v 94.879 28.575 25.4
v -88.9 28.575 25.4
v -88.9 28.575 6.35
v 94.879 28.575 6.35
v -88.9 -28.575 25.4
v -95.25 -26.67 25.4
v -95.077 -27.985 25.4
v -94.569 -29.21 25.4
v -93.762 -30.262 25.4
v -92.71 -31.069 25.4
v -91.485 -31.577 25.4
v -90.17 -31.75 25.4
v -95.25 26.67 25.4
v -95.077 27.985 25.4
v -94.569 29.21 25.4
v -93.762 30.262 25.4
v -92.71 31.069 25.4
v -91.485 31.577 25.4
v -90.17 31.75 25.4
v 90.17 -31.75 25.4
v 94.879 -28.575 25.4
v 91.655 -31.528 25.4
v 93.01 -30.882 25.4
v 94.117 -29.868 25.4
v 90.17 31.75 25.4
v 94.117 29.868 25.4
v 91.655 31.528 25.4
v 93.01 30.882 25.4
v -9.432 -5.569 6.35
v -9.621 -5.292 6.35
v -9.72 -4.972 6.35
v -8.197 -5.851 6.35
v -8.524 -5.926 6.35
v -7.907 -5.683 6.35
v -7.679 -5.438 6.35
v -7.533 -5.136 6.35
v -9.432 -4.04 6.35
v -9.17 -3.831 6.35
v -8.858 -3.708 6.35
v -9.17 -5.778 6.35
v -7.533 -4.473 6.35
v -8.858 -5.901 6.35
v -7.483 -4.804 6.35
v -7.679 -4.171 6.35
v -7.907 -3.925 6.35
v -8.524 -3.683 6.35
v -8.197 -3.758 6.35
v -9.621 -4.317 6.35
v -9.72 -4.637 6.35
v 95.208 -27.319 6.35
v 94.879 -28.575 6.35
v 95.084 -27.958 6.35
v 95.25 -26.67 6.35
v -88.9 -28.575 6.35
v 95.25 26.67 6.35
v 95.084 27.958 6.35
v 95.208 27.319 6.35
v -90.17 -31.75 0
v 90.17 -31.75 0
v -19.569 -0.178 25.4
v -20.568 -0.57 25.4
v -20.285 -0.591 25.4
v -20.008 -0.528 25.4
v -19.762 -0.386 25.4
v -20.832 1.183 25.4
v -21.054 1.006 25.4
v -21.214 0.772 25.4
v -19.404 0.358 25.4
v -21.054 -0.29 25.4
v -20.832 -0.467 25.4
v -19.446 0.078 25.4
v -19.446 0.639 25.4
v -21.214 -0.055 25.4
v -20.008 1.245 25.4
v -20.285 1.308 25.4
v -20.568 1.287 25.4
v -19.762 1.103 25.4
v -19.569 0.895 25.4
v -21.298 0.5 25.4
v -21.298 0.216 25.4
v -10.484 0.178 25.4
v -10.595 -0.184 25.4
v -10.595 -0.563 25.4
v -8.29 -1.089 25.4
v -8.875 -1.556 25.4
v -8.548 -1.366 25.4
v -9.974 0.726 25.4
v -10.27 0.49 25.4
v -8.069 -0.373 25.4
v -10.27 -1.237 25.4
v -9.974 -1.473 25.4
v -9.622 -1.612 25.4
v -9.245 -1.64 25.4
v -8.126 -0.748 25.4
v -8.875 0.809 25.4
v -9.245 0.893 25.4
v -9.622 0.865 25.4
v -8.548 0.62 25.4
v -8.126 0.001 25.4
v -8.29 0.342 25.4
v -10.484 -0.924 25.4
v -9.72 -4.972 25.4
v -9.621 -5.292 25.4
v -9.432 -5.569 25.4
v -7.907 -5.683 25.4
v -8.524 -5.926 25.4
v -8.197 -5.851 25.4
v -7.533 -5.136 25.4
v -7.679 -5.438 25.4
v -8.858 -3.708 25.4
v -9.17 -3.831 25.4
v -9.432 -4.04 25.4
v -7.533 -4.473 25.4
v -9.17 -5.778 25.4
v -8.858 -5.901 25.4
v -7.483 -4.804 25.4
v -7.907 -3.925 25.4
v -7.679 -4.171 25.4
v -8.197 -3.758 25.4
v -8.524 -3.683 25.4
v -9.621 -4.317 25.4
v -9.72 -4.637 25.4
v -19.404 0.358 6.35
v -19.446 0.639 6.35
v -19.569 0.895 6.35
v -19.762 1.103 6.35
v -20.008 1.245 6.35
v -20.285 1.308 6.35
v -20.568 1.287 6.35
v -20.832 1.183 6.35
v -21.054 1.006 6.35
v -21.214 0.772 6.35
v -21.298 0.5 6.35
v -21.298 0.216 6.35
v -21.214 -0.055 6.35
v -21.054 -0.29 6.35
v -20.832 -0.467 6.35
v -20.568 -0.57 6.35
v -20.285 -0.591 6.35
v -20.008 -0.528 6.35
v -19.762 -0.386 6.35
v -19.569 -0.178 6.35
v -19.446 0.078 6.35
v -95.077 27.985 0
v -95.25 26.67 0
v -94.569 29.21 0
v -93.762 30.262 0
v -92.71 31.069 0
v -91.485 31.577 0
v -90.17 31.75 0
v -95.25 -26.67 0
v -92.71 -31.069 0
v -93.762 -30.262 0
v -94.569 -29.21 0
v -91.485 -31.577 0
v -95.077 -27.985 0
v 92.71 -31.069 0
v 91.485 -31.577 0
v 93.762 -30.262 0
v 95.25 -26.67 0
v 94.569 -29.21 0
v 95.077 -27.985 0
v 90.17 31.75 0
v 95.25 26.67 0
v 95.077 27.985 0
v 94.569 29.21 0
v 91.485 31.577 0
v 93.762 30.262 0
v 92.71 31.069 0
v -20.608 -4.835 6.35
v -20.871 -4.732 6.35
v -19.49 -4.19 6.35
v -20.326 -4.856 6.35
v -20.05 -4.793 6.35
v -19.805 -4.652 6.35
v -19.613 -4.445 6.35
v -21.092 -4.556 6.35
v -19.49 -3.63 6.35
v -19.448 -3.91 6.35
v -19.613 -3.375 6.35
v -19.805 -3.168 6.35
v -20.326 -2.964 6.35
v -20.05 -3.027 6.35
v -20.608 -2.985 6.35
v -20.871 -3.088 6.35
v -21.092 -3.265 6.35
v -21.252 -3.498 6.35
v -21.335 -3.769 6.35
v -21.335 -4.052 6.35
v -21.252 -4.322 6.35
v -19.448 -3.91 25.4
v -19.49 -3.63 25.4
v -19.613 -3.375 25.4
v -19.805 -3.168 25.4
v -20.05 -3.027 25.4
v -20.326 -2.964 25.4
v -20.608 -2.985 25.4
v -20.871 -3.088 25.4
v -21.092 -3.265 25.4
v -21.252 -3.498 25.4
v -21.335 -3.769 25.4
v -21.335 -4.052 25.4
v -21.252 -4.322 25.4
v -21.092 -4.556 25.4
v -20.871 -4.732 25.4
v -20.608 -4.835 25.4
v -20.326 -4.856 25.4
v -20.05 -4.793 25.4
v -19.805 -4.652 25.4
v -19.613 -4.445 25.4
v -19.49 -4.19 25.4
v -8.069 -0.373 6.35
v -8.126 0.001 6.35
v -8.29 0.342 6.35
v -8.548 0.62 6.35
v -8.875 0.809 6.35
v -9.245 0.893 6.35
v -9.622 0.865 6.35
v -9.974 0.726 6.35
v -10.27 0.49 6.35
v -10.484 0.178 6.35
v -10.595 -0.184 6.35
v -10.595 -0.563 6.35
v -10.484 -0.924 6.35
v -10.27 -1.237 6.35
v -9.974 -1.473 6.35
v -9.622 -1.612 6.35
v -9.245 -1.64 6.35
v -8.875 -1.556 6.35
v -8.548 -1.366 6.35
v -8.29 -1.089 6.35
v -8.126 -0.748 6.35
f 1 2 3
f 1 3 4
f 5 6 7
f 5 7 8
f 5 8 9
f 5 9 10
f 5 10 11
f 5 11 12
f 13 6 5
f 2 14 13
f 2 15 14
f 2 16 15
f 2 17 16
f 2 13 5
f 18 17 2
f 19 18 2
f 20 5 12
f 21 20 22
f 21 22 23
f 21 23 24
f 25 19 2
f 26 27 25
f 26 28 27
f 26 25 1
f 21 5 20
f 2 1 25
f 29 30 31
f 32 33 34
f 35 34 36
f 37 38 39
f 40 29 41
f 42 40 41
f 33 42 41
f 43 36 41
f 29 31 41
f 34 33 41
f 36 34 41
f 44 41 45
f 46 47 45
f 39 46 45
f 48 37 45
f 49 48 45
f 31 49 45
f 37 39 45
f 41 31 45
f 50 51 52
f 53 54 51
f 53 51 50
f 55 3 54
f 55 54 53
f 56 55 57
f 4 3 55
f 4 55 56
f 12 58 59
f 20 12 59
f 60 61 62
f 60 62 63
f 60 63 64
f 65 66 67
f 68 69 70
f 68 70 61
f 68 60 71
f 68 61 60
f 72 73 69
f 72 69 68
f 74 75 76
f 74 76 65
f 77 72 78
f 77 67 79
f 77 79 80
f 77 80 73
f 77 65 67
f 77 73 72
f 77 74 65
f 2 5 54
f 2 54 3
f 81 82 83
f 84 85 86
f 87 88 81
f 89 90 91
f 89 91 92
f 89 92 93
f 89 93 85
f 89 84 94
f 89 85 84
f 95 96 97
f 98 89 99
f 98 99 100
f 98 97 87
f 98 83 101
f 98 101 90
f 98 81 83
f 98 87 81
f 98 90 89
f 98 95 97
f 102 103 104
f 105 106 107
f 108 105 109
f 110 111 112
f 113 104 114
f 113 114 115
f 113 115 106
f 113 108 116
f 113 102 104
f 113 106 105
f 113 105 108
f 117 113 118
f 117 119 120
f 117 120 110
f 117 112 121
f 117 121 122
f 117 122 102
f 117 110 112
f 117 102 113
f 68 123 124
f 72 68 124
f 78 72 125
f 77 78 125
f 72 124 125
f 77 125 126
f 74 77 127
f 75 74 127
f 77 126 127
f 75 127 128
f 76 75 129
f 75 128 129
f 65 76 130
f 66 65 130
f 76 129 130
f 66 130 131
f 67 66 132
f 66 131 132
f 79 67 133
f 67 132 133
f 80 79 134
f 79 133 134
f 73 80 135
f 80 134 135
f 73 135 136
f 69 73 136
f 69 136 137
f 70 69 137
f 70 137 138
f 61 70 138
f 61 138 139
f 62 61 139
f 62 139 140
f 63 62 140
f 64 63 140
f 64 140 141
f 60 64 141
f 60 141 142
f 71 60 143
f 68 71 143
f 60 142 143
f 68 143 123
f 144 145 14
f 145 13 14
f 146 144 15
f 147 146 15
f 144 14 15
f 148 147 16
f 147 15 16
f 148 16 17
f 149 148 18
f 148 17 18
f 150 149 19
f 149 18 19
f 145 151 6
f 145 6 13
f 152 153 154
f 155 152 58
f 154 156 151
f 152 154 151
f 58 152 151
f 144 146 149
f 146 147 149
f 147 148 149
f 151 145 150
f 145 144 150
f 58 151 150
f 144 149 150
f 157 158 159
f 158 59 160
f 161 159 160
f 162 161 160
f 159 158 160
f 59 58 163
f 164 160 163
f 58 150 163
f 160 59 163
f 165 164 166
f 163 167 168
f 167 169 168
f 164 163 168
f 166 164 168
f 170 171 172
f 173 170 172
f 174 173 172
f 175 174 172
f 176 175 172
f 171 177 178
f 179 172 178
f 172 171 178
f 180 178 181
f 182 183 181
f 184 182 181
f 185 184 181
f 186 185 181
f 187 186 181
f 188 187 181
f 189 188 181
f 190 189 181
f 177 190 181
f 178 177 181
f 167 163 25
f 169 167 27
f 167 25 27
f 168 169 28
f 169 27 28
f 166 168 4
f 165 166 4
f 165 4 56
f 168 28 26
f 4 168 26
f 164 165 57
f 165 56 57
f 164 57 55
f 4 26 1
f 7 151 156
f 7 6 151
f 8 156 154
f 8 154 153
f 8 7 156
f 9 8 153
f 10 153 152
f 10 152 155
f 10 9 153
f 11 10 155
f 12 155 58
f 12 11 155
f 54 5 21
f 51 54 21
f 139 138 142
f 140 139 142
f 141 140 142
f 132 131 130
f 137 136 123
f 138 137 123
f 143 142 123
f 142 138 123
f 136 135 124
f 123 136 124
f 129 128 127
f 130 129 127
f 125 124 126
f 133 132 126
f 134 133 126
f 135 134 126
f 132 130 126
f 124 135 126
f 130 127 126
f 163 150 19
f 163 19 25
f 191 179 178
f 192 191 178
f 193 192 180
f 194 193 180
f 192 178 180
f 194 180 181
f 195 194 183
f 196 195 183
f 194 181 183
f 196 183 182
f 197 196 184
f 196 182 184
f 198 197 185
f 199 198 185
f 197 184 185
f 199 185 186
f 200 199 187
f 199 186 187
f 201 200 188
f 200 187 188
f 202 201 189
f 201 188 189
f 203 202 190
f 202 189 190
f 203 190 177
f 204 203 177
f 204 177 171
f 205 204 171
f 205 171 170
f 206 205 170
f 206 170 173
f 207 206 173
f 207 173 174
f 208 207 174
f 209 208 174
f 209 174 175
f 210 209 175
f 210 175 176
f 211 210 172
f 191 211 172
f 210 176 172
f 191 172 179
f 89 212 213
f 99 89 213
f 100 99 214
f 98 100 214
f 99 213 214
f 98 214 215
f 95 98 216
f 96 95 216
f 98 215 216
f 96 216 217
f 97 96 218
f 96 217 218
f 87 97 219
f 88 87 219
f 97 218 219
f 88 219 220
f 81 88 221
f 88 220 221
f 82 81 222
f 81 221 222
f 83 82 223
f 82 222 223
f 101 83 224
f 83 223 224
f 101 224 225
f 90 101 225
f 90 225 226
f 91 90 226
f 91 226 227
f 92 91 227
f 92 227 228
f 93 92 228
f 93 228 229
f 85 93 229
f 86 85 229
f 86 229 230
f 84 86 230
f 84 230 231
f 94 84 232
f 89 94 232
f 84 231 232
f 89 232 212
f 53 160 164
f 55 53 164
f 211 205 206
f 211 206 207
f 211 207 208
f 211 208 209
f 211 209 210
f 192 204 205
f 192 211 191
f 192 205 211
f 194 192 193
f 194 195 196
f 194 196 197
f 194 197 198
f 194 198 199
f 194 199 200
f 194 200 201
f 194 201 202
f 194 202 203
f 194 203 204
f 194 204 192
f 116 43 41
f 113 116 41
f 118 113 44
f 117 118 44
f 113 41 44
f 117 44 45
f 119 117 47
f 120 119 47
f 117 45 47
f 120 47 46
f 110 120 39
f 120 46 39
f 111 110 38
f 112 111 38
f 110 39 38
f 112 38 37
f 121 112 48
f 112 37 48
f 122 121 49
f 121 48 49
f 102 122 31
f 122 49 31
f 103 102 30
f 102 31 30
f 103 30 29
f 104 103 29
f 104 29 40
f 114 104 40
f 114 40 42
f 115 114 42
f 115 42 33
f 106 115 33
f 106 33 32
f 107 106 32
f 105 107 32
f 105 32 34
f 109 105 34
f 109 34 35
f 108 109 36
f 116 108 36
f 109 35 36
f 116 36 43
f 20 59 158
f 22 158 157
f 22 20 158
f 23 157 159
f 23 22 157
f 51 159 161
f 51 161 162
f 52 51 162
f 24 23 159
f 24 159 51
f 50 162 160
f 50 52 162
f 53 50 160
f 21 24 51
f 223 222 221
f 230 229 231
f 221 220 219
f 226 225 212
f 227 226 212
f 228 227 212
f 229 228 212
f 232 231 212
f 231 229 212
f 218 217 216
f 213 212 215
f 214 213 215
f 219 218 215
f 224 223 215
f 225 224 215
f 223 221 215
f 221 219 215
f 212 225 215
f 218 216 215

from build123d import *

# Parameters (mm, degrees)
F0_W     = 190.5
F0_H     = 63.5
F1_DEPTH = 25.4
F2_W     = 184.15
F2_H     = 57.15
F3_DEPTH = 19.05
F4_R     = 0.952499
F4_R_2   = 0.949023
F4_R_3   = 1.27
F4_R_4   = 1.12437
F5_DEPTH = 19.05
F6_R     = 5.08


with BuildPart() as f1:
    # F0 (on Top) → F1 (new body)
    with BuildSketch(Plane.XY):
        Rectangle(F0_W, F0_H)
    extrude(amount=F1_DEPTH)

    # F2 (on face) → F3 (cut)
    with BuildSketch(Plane.XY.offset(25.4)):
        with Locations((3.175, 0)):
            Rectangle(F2_W, F2_H)
    extrude(amount=-F3_DEPTH, mode=Mode.SUBTRACT)

    # F6
    f6_edges = [f1.edges().sort_by_distance(p)[0] for p in [
        (-95.25, -31.75, 12.7),
        (-95.25, 31.75, 12.7),
        (95.25, 31.75, 12.7),
        (95.25, -31.75, 12.7),
    ]]
    fillet(f6_edges, radius=F6_R)


with BuildPart() as f5:
    # F4 (on face) → F5 (new body)
    with BuildSketch(Plane.XY.offset(6.35)):
        with Locations((-20.356032, 0.35835)):
            Circle(F4_R)
        with Locations((-20.396684, -3.910078)):
            Circle(F4_R_2)
        with Locations((-9.339423, -0.373381)):
            Circle(F4_R_3)
        with Locations((-8.607691, -4.804415)):
            Circle(F4_R_4)
    extrude(amount=F5_DEPTH)


solid = Compound([f1.part, f5.part])
